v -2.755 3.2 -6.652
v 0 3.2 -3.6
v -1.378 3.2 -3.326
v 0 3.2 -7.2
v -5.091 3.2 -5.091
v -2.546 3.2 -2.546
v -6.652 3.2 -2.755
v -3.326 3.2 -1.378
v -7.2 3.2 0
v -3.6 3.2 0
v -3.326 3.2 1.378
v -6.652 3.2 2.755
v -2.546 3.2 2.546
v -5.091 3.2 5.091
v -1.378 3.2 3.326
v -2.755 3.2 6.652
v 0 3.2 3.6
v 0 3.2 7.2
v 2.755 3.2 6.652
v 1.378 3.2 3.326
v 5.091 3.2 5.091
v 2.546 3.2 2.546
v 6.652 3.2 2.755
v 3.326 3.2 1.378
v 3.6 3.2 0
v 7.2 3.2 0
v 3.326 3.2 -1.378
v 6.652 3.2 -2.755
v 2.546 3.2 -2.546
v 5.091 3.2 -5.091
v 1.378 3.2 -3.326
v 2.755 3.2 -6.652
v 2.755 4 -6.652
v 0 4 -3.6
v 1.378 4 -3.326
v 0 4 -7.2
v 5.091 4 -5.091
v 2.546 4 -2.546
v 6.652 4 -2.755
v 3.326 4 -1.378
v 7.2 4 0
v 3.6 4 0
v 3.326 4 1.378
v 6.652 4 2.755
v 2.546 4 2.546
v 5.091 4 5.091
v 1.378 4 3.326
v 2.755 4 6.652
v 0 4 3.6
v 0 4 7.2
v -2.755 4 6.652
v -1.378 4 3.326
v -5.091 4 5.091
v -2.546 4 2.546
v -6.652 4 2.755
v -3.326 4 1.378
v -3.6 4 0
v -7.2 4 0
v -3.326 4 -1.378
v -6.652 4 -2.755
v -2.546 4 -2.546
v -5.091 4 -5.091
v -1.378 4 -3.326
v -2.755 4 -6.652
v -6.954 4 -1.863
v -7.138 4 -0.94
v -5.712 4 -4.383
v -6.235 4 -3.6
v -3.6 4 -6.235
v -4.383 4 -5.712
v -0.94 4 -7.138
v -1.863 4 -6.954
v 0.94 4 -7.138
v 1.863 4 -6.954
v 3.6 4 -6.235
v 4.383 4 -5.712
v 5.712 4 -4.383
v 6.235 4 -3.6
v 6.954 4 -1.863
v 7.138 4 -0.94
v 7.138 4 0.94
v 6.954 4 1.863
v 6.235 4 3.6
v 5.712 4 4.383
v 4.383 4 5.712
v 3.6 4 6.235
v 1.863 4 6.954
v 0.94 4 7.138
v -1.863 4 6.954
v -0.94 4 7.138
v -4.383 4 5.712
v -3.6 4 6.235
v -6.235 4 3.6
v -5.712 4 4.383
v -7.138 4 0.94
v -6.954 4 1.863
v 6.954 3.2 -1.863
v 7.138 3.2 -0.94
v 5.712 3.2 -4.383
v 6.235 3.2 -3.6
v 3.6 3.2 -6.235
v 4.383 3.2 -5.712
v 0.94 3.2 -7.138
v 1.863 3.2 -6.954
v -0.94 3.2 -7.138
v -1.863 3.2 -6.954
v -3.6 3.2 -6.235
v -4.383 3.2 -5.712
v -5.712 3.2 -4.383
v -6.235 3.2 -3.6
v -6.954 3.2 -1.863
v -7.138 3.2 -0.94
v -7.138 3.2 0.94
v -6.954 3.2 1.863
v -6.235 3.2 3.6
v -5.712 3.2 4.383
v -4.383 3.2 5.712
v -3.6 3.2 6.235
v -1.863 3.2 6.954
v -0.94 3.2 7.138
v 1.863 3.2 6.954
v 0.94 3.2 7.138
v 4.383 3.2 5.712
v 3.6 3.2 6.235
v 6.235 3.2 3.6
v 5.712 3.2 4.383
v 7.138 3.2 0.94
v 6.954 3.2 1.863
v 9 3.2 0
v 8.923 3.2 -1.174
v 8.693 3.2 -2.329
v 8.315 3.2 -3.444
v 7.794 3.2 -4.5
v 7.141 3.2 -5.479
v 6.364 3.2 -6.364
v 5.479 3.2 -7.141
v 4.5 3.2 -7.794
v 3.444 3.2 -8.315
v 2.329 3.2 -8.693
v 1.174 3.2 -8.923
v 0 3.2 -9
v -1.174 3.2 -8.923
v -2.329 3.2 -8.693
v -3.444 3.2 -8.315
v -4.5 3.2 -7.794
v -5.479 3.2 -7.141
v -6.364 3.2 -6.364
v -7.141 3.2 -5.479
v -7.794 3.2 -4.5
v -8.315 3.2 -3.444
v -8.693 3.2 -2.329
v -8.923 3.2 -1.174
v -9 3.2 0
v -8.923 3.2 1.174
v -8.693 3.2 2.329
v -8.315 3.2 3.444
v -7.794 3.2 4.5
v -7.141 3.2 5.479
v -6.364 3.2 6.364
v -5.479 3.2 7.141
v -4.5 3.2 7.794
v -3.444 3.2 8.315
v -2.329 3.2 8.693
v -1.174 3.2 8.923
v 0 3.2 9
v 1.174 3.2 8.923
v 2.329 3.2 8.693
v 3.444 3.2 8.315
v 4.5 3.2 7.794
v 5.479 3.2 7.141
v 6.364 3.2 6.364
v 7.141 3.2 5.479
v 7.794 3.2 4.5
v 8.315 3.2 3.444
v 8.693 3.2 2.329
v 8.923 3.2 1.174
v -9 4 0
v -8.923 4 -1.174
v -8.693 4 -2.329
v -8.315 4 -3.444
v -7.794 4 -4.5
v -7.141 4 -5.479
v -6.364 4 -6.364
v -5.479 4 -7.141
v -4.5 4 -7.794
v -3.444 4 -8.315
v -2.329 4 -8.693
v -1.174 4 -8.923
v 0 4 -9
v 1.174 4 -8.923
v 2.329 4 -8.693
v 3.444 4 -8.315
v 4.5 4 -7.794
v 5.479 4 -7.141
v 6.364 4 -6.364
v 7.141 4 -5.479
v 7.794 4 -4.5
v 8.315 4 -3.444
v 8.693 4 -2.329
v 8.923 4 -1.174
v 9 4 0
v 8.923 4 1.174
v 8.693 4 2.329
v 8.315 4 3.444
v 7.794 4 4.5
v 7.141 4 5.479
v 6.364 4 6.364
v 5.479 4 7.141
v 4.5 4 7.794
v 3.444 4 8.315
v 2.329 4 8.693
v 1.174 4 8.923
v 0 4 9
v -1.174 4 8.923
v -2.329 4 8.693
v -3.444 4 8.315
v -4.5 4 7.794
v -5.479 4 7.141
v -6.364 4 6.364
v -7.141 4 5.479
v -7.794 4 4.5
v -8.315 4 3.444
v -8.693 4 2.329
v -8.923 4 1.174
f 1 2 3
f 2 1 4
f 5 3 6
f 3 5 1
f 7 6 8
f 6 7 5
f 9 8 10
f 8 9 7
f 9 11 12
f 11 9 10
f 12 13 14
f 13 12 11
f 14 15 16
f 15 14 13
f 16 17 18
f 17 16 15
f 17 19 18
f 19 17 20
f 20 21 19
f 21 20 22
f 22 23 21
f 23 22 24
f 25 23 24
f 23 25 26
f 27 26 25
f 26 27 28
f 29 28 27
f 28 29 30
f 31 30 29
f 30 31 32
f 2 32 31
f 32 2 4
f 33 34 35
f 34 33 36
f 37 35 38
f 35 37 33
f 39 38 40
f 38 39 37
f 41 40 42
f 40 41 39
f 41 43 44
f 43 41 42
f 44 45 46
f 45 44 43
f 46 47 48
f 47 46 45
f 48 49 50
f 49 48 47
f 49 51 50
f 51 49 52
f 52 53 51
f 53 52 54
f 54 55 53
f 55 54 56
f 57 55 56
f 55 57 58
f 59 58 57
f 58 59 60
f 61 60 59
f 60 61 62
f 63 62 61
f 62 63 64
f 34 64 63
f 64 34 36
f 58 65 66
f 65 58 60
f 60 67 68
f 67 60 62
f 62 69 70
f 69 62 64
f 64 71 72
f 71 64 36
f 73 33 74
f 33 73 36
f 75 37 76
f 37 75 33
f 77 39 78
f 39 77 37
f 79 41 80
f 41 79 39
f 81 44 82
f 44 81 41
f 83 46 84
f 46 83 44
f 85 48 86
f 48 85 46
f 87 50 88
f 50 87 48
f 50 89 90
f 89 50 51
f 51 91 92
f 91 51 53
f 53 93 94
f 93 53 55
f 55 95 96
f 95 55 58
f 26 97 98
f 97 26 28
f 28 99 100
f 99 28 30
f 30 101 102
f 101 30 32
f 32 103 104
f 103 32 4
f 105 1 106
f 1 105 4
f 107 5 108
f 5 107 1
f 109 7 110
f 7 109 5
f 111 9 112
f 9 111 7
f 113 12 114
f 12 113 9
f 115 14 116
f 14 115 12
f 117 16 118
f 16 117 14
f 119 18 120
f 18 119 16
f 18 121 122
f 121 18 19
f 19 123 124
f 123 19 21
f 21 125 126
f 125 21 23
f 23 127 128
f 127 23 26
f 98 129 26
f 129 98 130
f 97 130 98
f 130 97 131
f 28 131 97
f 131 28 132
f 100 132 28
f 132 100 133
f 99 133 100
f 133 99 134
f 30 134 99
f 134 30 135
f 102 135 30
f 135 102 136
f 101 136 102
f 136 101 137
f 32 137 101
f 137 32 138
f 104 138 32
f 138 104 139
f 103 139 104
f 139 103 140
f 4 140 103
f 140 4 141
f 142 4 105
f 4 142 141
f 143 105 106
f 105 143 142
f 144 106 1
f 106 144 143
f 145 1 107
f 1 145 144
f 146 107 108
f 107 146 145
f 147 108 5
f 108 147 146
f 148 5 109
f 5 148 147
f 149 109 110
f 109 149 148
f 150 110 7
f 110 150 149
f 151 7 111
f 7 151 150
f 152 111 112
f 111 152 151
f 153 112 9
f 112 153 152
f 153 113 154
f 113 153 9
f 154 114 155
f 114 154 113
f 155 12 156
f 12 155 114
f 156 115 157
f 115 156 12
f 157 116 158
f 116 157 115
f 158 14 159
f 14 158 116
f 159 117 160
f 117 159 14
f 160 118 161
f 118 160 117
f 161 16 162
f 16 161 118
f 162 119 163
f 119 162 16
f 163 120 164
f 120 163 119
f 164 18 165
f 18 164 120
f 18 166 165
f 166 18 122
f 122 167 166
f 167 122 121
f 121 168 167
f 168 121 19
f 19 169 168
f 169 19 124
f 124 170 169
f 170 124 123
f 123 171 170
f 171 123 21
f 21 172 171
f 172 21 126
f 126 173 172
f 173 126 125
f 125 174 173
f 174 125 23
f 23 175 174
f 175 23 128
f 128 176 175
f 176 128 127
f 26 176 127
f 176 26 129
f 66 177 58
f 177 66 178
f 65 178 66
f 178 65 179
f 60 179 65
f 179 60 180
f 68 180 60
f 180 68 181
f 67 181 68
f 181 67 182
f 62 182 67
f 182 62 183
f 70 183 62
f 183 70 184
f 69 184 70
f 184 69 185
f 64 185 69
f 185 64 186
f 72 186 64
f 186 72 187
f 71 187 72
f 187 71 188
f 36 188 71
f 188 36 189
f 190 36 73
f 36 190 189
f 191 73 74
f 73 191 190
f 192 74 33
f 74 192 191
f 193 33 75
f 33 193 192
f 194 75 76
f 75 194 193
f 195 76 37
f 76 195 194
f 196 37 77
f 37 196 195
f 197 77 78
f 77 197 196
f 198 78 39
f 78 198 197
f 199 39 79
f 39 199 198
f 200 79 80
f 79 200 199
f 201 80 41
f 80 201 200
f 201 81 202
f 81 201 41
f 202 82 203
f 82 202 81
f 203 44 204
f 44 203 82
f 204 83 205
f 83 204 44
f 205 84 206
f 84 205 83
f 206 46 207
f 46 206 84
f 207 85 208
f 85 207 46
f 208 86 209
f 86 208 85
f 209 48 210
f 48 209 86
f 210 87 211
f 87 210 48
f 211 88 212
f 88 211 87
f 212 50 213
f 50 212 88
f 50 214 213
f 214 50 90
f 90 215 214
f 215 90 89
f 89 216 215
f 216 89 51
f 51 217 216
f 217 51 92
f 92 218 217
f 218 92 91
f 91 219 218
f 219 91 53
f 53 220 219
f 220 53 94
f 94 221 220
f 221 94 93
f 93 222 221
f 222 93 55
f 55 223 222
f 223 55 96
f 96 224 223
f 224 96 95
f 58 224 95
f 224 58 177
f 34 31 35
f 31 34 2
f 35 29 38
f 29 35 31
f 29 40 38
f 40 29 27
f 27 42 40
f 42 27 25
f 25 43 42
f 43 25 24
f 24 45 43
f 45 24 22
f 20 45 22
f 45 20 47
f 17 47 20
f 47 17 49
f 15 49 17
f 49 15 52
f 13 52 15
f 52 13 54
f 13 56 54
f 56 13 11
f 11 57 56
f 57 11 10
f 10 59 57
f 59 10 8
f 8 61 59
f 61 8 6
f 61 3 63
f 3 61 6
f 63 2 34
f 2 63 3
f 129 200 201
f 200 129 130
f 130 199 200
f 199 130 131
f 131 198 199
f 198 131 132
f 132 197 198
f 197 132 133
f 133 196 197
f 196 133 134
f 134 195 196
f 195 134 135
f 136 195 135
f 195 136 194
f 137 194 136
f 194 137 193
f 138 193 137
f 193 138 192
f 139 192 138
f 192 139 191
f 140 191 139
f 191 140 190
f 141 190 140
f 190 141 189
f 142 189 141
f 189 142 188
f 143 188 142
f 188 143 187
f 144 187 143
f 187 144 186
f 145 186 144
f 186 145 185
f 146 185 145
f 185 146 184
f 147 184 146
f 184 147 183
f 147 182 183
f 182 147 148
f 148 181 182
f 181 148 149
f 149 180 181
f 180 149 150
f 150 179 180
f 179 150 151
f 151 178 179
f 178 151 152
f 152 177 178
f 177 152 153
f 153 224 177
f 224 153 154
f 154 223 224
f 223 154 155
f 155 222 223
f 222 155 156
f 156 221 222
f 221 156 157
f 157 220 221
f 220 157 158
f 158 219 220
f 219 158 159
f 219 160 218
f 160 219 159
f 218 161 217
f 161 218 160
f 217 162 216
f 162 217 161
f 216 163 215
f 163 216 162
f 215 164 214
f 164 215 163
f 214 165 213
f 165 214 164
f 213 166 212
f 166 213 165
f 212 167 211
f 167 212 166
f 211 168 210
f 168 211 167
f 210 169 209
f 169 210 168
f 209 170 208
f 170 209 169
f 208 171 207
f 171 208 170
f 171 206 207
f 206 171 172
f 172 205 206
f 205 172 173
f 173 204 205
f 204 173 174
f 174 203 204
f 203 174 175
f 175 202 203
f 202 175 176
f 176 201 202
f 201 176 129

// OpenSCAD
// file: ../p/48/1-4edge.scad
use <../../lib.scad>
function ldraw_lib__48__1_4edge() = [
// 0 Hi-Res Circle 0.25
// 0 Name: 48\1-4edge.dat
// 0 Author: Manfred Moolhuysen
// 0 !LDRAW_ORG 48_Primitive UPDATE 2010-02
// 0 !LICENSE Licensed under CC BY 2.0 and CC BY 4.0 : see CAreadme.txt
// 
// 0 BFC CERTIFY CCW
  [0,"BFC","CERTIFY"],
  [0,"BFC","CCW"],
// 
// 0 !HISTORY 1999-07-05 [PTadmin] Official Update 1999-05
// 0 !HISTORY 2007-06-24 [PTadmin] Header formatted for Contributor Agreement
// 0 !HISTORY 2008-07-01 [PTadmin] Official Update 2008-01
// 0 !HISTORY 2010-03-17 [MagFors] Updated description
// 0 !HISTORY 2010-05-21 [mikeheide] BFC'ed and compacted numbers (saved 10% filesize)
// 0 !HISTORY 2010-07-05 [PTadmin] Official Update 2010-02
// 
// 
// 2 24 1 0 0 0.9914 0 0.1305
  [2,24,1,0,0,0.9914,0,0.1305],
// 2 24 0.9914 0 0.1305 0.9659 0 0.2588
  [2,24,0.9914,0,0.1305,0.9659,0,0.2588],
// 2 24 0.9659 0 0.2588 0.9239 0 0.3827
  [2,24,0.9659,0,0.2588,0.9239,0,0.3827],
// 2 24 0.9239 0 0.3827 0.866 0 0.5
  [2,24,0.9239,0,0.3827,0.866,0,0.5],
// 2 24 0.866 0 0.5 0.7934 0 0.6088
  [2,24,0.866,0,0.5,0.7934,0,0.6088],
// 2 24 0.7934 0 0.6088 0.7071 0 0.7071
  [2,24,0.7934,0,0.6088,0.7071,0,0.7071],
// 2 24 0.7071 0 0.7071 0.6088 0 0.7934
  [2,24,0.7071,0,0.7071,0.6088,0,0.7934],
// 2 24 0.6088 0 0.7934 0.5 0 0.866
  [2,24,0.6088,0,0.7934,0.5,0,0.866],
// 2 24 0.5 0 0.866 0.3827 0 0.9239
  [2,24,0.5,0,0.866,0.3827,0,0.9239],
// 2 24 0.3827 0 0.9239 0.2588 0 0.9659
  [2,24,0.3827,0,0.9239,0.2588,0,0.9659],
// 2 24 0.2588 0 0.9659 0.1305 0 0.9914
  [2,24,0.2588,0,0.9659,0.1305,0,0.9914],
// 2 24 0.1305 0 0.9914 0 0 1
  [2,24,0.1305,0,0.9914,0,0,1],
// 0 //
];
makepoly(ldraw_lib__48__1_4edge(), line=0.2);
// file: ../p/48/1-4cyli.scad
use <../../lib.scad>
function ldraw_lib__48__1_4cyli() = [
// 0 Hi-Res Cylinder 0.25
// 0 Name: 48\1-4cyli.dat
// 0 Author: Manfred Moolhuysen
// 0 !LDRAW_ORG 48_Primitive UPDATE 2009-01
// 0 !LICENSE Licensed under CC BY 2.0 and CC BY 4.0 : see CAreadme.txt
// 
// 0 BFC CERTIFY CCW
  [0,"BFC","CERTIFY"],
  [0,"BFC","CCW"],
// 
// 0 !HISTORY 1999-07-05 [PTadmin] Official Update 1999-05
// 0 !HISTORY 2002-02-28 [hafhead] Added BFC statement
// 0 !HISTORY 2002-04-25 [PTadmin] Official Update 2002-02
// 0 !HISTORY 2007-06-24 [PTadmin] Header formatted for Contributor Agreement
// 0 !HISTORY 2008-07-01 [PTadmin] Official Update 2008-01
// 0 !HISTORY 2008-07-07 [guyvivan] Made BFC'ed CCW (2005-12-06)
// 0 !HISTORY 2009-05-02 [PTadmin] Official Update 2009-01
// 
// 
// 4 16 0.9914 0 0.1305 1 0 0 1 1 0 0.9914 1 0.1305
  [4,16,0.9914,0,0.1305,1,0,0,1,1,0,0.9914,1,0.1305],
// 4 16 0.9659 0 0.2588 0.9914 0 0.1305 0.9914 1 0.1305 0.9659 1 0.2588
  [4,16,0.9659,0,0.2588,0.9914,0,0.1305,0.9914,1,0.1305,0.9659,1,0.2588],
// 4 16 0.9239 0 0.3827 0.9659 0 0.2588 0.9659 1 0.2588 0.9239 1 0.3827
  [4,16,0.9239,0,0.3827,0.9659,0,0.2588,0.9659,1,0.2588,0.9239,1,0.3827],
// 4 16 0.866 0 0.5 0.9239 0 0.3827 0.9239 1 0.3827 0.866 1 0.5
  [4,16,0.866,0,0.5,0.9239,0,0.3827,0.9239,1,0.3827,0.866,1,0.5],
// 4 16 0.7934 0 0.6088 0.866 0 0.5 0.866 1 0.5 0.7934 1 0.6088
  [4,16,0.7934,0,0.6088,0.866,0,0.5,0.866,1,0.5,0.7934,1,0.6088],
// 4 16 0.7071 0 0.7071 0.7934 0 0.6088 0.7934 1 0.6088 0.7071 1 0.7071
  [4,16,0.7071,0,0.7071,0.7934,0,0.6088,0.7934,1,0.6088,0.7071,1,0.7071],
// 4 16 0.6088 0 0.7934 0.7071 0 0.7071 0.7071 1 0.7071 0.6088 1 0.7934
  [4,16,0.6088,0,0.7934,0.7071,0,0.7071,0.7071,1,0.7071,0.6088,1,0.7934],
// 4 16 0.5 0 0.866 0.6088 0 0.7934 0.6088 1 0.7934 0.5 1 0.866
  [4,16,0.5,0,0.866,0.6088,0,0.7934,0.6088,1,0.7934,0.5,1,0.866],
// 4 16 0.3827 0 0.9239 0.5 0 0.866 0.5 1 0.866 0.3827 1 0.9239
  [4,16,0.3827,0,0.9239,0.5,0,0.866,0.5,1,0.866,0.3827,1,0.9239],
// 4 16 0.2588 0 0.9659 0.3827 0 0.9239 0.3827 1 0.9239 0.2588 1 0.9659
  [4,16,0.2588,0,0.9659,0.3827,0,0.9239,0.3827,1,0.9239,0.2588,1,0.9659],
// 4 16 0.1305 0 0.9914 0.2588 0 0.9659 0.2588 1 0.9659 0.1305 1 0.9914
  [4,16,0.1305,0,0.9914,0.2588,0,0.9659,0.2588,1,0.9659,0.1305,1,0.9914],
// 4 16 0 0 1 0.1305 0 0.9914 0.1305 1 0.9914 0 1 1
  [4,16,0,0,1,0.1305,0,0.9914,0.1305,1,0.9914,0,1,1],
// 
// 0 conditional lines
// 5 24 1 1 0 1 0 0 1 1 -1 0.9914 1 0.1305
  [5,24,1,1,0,1,0,0,1,1,-1,0.9914,1,0.1305],
// 5 24 0.9914 1 0.1305 0.9914 0 0.1305 1 1 0 0.9659 1 0.2588
  [5,24,0.9914,1,0.1305,0.9914,0,0.1305,1,1,0,0.9659,1,0.2588],
// 5 24 0.9659 1 0.2588 0.9659 0 0.2588 0.9914 1 0.1305 0.9239 1 0.3827
  [5,24,0.9659,1,0.2588,0.9659,0,0.2588,0.9914,1,0.1305,0.9239,1,0.3827],
// 5 24 0.9239 1 0.3827 0.9239 0 0.3827 0.9659 1 0.2588 0.866 1 0.5
  [5,24,0.9239,1,0.3827,0.9239,0,0.3827,0.9659,1,0.2588,0.866,1,0.5],
// 5 24 0.866 1 0.5 0.866 0 0.5 0.9239 1 0.3827 0.7934 1 0.6088
  [5,24,0.866,1,0.5,0.866,0,0.5,0.9239,1,0.3827,0.7934,1,0.6088],
// 5 24 0.7934 1 0.6088 0.7934 0 0.6088 0.866 1 0.5 0.7071 1 0.7071
  [5,24,0.7934,1,0.6088,0.7934,0,0.6088,0.866,1,0.5,0.7071,1,0.7071],
// 5 24 0.7071 1 0.7071 0.7071 0 0.7071 0.7934 1 0.6088 0.6088 1 0.7934
  [5,24,0.7071,1,0.7071,0.7071,0,0.7071,0.7934,1,0.6088,0.6088,1,0.7934],
// 5 24 0.6088 1 0.7934 0.6088 0 0.7934 0.7071 1 0.7071 0.5 1 0.866
  [5,24,0.6088,1,0.7934,0.6088,0,0.7934,0.7071,1,0.7071,0.5,1,0.866],
// 5 24 0.5 1 0.866 0.5 0 0.866 0.6088 1 0.7934 0.3827 1 0.9239
  [5,24,0.5,1,0.866,0.5,0,0.866,0.6088,1,0.7934,0.3827,1,0.9239],
// 5 24 0.3827 1 0.9239 0.3827 0 0.9239 0.5 1 0.866 0.2588 1 0.9659
  [5,24,0.3827,1,0.9239,0.3827,0,0.9239,0.5,1,0.866,0.2588,1,0.9659],
// 5 24 0.2588 1 0.9659 0.2588 0 0.9659 0.3827 1 0.9239 0.1305 1 0.9914
  [5,24,0.2588,1,0.9659,0.2588,0,0.9659,0.3827,1,0.9239,0.1305,1,0.9914],
// 5 24 0.1305 1 0.9914 0.1305 0 0.9914 0.2588 1 0.9659 0 1 1
  [5,24,0.1305,1,0.9914,0.1305,0,0.9914,0.2588,1,0.9659,0,1,1],
// 5 24 0 1 1 0 0 1 0.1305 1 0.9914 -1 1 1
  [5,24,0,1,1,0,0,1,0.1305,1,0.9914,-1,1,1],
// 
// 0 end of file
];
makepoly(ldraw_lib__48__1_4cyli(), line=0.2);
// file: ../p/48/4-4ring4.scad
use <../../lib.scad>
function ldraw_lib__48__4_4ring4() = [
// 0 Hi-Res Ring  4 x 1.0
// 0 Name: 48\4-4ring4.dat
// 0 Author: Mark Kennedy [mkennedy]
// 0 !LDRAW_ORG 48_Primitive UPDATE 2012-02
// 0 !LICENSE Licensed under CC BY 2.0 and CC BY 4.0 : see CAreadme.txt
// 
// 0 BFC CERTIFY CCW
  [0,"BFC","CERTIFY"],
  [0,"BFC","CCW"],
// 
// 0 !HISTORY 2004-04-22 [PTadmin] Official Update 2004-02
// 0 !HISTORY 2007-06-24 [PTadmin] Header formatted for Contributor Agreement
// 0 !HISTORY 2008-07-01 [PTadmin] Official Update 2008-01
// 0 !HISTORY 2012-02-27 [Philo] Changed to CCW
// 0 !HISTORY 2012-08-09 [PTadmin] Official Update 2012-02
// 
// 
// 4 16 5 0 0 4.957 0 0.6525 3.9656 0 0.522 4 0 0
  [4,16,5,0,0,4.957,0,0.6525,3.9656,0,0.522,4,0,0],
// 4 16 4.957 0 0.6525 4.8295 0 1.294 3.8636 0 1.0352 3.9656 0 0.522
  [4,16,4.957,0,0.6525,4.8295,0,1.294,3.8636,0,1.0352,3.9656,0,0.522],
// 4 16 4.8295 0 1.294 4.6195 0 1.9135 3.6956 0 1.5308 3.8636 0 1.0352
  [4,16,4.8295,0,1.294,4.6195,0,1.9135,3.6956,0,1.5308,3.8636,0,1.0352],
// 4 16 4.6195 0 1.9135 4.33 0 2.5 3.464 0 2 3.6956 0 1.5308
  [4,16,4.6195,0,1.9135,4.33,0,2.5,3.464,0,2,3.6956,0,1.5308],
// 4 16 4.33 0 2.5 3.967 0 3.044 3.1736 0 2.4352 3.464 0 2
  [4,16,4.33,0,2.5,3.967,0,3.044,3.1736,0,2.4352,3.464,0,2],
// 4 16 3.967 0 3.044 3.5355 0 3.5355 2.8284 0 2.8284 3.1736 0 2.4352
  [4,16,3.967,0,3.044,3.5355,0,3.5355,2.8284,0,2.8284,3.1736,0,2.4352],
// 4 16 3.5355 0 3.5355 3.044 0 3.967 2.4352 0 3.1736 2.8284 0 2.8284
  [4,16,3.5355,0,3.5355,3.044,0,3.967,2.4352,0,3.1736,2.8284,0,2.8284],
// 4 16 3.044 0 3.967 2.5 0 4.33 2 0 3.464 2.4352 0 3.1736
  [4,16,3.044,0,3.967,2.5,0,4.33,2,0,3.464,2.4352,0,3.1736],
// 4 16 2.5 0 4.33 1.9135 0 4.6195 1.5308 0 3.6956 2 0 3.464
  [4,16,2.5,0,4.33,1.9135,0,4.6195,1.5308,0,3.6956,2,0,3.464],
// 4 16 1.9135 0 4.6195 1.294 0 4.8295 1.0352 0 3.8636 1.5308 0 3.6956
  [4,16,1.9135,0,4.6195,1.294,0,4.8295,1.0352,0,3.8636,1.5308,0,3.6956],
// 4 16 1.294 0 4.8295 0.6525 0 4.957 0.522 0 3.9656 1.0352 0 3.8636
  [4,16,1.294,0,4.8295,0.6525,0,4.957,0.522,0,3.9656,1.0352,0,3.8636],
// 4 16 0.6525 0 4.957 0 0 5 0 0 4 0.522 0 3.9656
  [4,16,0.6525,0,4.957,0,0,5,0,0,4,0.522,0,3.9656],
// 4 16 0 0 5 -0.6525 0 4.957 -0.522 0 3.9656 0 0 4
  [4,16,0,0,5,-0.6525,0,4.957,-0.522,0,3.9656,0,0,4],
// 4 16 -0.6525 0 4.957 -1.294 0 4.8295 -1.0352 0 3.8636 -0.522 0 3.9656
  [4,16,-0.6525,0,4.957,-1.294,0,4.8295,-1.0352,0,3.8636,-0.522,0,3.9656],
// 4 16 -1.294 0 4.8295 -1.9135 0 4.6195 -1.5308 0 3.6956 -1.0352 0 3.8636
  [4,16,-1.294,0,4.8295,-1.9135,0,4.6195,-1.5308,0,3.6956,-1.0352,0,3.8636],
// 4 16 -1.9135 0 4.6195 -2.5 0 4.33 -2 0 3.464 -1.5308 0 3.6956
  [4,16,-1.9135,0,4.6195,-2.5,0,4.33,-2,0,3.464,-1.5308,0,3.6956],
// 4 16 -2.5 0 4.33 -3.044 0 3.967 -2.4352 0 3.1736 -2 0 3.464
  [4,16,-2.5,0,4.33,-3.044,0,3.967,-2.4352,0,3.1736,-2,0,3.464],
// 4 16 -3.044 0 3.967 -3.5355 0 3.5355 -2.8284 0 2.8284 -2.4352 0 3.1736
  [4,16,-3.044,0,3.967,-3.5355,0,3.5355,-2.8284,0,2.8284,-2.4352,0,3.1736],
// 4 16 -3.5355 0 3.5355 -3.967 0 3.044 -3.1736 0 2.4352 -2.8284 0 2.8284
  [4,16,-3.5355,0,3.5355,-3.967,0,3.044,-3.1736,0,2.4352,-2.8284,0,2.8284],
// 4 16 -3.967 0 3.044 -4.33 0 2.5 -3.464 0 2 -3.1736 0 2.4352
  [4,16,-3.967,0,3.044,-4.33,0,2.5,-3.464,0,2,-3.1736,0,2.4352],
// 4 16 -4.33 0 2.5 -4.6195 0 1.9135 -3.6956 0 1.5308 -3.464 0 2
  [4,16,-4.33,0,2.5,-4.6195,0,1.9135,-3.6956,0,1.5308,-3.464,0,2],
// 4 16 -4.6195 0 1.9135 -4.8295 0 1.294 -3.8636 0 1.0352 -3.6956 0 1.5308
  [4,16,-4.6195,0,1.9135,-4.8295,0,1.294,-3.8636,0,1.0352,-3.6956,0,1.5308],
// 4 16 -4.8295 0 1.294 -4.957 0 0.6525 -3.9656 0 0.522 -3.8636 0 1.0352
  [4,16,-4.8295,0,1.294,-4.957,0,0.6525,-3.9656,0,0.522,-3.8636,0,1.0352],
// 4 16 -4.957 0 0.6525 -5 0 0 -4 0 0 -3.9656 0 0.522
  [4,16,-4.957,0,0.6525,-5,0,0,-4,0,0,-3.9656,0,0.522],
// 4 16 -5 0 0 -4.957 0 -0.6525 -3.9656 0 -0.522 -4 0 0
  [4,16,-5,0,0,-4.957,0,-0.6525,-3.9656,0,-0.522,-4,0,0],
// 4 16 -4.957 0 -0.6525 -4.8295 0 -1.294 -3.8636 0 -1.0352 -3.9656 0 -0.522
  [4,16,-4.957,0,-0.6525,-4.8295,0,-1.294,-3.8636,0,-1.0352,-3.9656,0,-0.522],
// 4 16 -4.8295 0 -1.294 -4.6195 0 -1.9135 -3.6956 0 -1.5308 -3.8636 0 -1.0352
  [4,16,-4.8295,0,-1.294,-4.6195,0,-1.9135,-3.6956,0,-1.5308,-3.8636,0,-1.0352],
// 4 16 -4.6195 0 -1.9135 -4.33 0 -2.5 -3.464 0 -2 -3.6956 0 -1.5308
  [4,16,-4.6195,0,-1.9135,-4.33,0,-2.5,-3.464,0,-2,-3.6956,0,-1.5308],
// 4 16 -4.33 0 -2.5 -3.967 0 -3.044 -3.1736 0 -2.4352 -3.464 0 -2
  [4,16,-4.33,0,-2.5,-3.967,0,-3.044,-3.1736,0,-2.4352,-3.464,0,-2],
// 4 16 -3.967 0 -3.044 -3.5355 0 -3.5355 -2.8284 0 -2.8284 -3.1736 0 -2.4352
  [4,16,-3.967,0,-3.044,-3.5355,0,-3.5355,-2.8284,0,-2.8284,-3.1736,0,-2.4352],
// 4 16 -3.5355 0 -3.5355 -3.044 0 -3.967 -2.4352 0 -3.1736 -2.8284 0 -2.8284
  [4,16,-3.5355,0,-3.5355,-3.044,0,-3.967,-2.4352,0,-3.1736,-2.8284,0,-2.8284],
// 4 16 -3.044 0 -3.967 -2.5 0 -4.33 -2 0 -3.464 -2.4352 0 -3.1736
  [4,16,-3.044,0,-3.967,-2.5,0,-4.33,-2,0,-3.464,-2.4352,0,-3.1736],
// 4 16 -2.5 0 -4.33 -1.9135 0 -4.6195 -1.5308 0 -3.6956 -2 0 -3.464
  [4,16,-2.5,0,-4.33,-1.9135,0,-4.6195,-1.5308,0,-3.6956,-2,0,-3.464],
// 4 16 -1.9135 0 -4.6195 -1.294 0 -4.8295 -1.0352 0 -3.8636 -1.5308 0 -3.6956
  [4,16,-1.9135,0,-4.6195,-1.294,0,-4.8295,-1.0352,0,-3.8636,-1.5308,0,-3.6956],
// 4 16 -1.294 0 -4.8295 -0.6525 0 -4.957 -0.522 0 -3.9656 -1.0352 0 -3.8636
  [4,16,-1.294,0,-4.8295,-0.6525,0,-4.957,-0.522,0,-3.9656,-1.0352,0,-3.8636],
// 4 16 -0.6525 0 -4.957 0 0 -5 0 0 -4 -0.522 0 -3.9656
  [4,16,-0.6525,0,-4.957,0,0,-5,0,0,-4,-0.522,0,-3.9656],
// 4 16 0 0 -5 0.6525 0 -4.957 0.522 0 -3.9656 0 0 -4
  [4,16,0,0,-5,0.6525,0,-4.957,0.522,0,-3.9656,0,0,-4],
// 4 16 0.6525 0 -4.957 1.294 0 -4.8295 1.0352 0 -3.8636 0.522 0 -3.9656
  [4,16,0.6525,0,-4.957,1.294,0,-4.8295,1.0352,0,-3.8636,0.522,0,-3.9656],
// 4 16 1.294 0 -4.8295 1.9135 0 -4.6195 1.5308 0 -3.6956 1.0352 0 -3.8636
  [4,16,1.294,0,-4.8295,1.9135,0,-4.6195,1.5308,0,-3.6956,1.0352,0,-3.8636],
// 4 16 1.9135 0 -4.6195 2.5 0 -4.33 2 0 -3.464 1.5308 0 -3.6956
  [4,16,1.9135,0,-4.6195,2.5,0,-4.33,2,0,-3.464,1.5308,0,-3.6956],
// 4 16 2.5 0 -4.33 3.044 0 -3.967 2.4352 0 -3.1736 2 0 -3.464
  [4,16,2.5,0,-4.33,3.044,0,-3.967,2.4352,0,-3.1736,2,0,-3.464],
// 4 16 3.044 0 -3.967 3.5355 0 -3.5355 2.8284 0 -2.8284 2.4352 0 -3.1736
  [4,16,3.044,0,-3.967,3.5355,0,-3.5355,2.8284,0,-2.8284,2.4352,0,-3.1736],
// 4 16 3.5355 0 -3.5355 3.967 0 -3.044 3.1736 0 -2.4352 2.8284 0 -2.8284
  [4,16,3.5355,0,-3.5355,3.967,0,-3.044,3.1736,0,-2.4352,2.8284,0,-2.8284],
// 4 16 3.967 0 -3.044 4.33 0 -2.5 3.464 0 -2 3.1736 0 -2.4352
  [4,16,3.967,0,-3.044,4.33,0,-2.5,3.464,0,-2,3.1736,0,-2.4352],
// 4 16 4.33 0 -2.5 4.6195 0 -1.9135 3.6956 0 -1.5308 3.464 0 -2
  [4,16,4.33,0,-2.5,4.6195,0,-1.9135,3.6956,0,-1.5308,3.464,0,-2],
// 4 16 4.6195 0 -1.9135 4.8295 0 -1.294 3.8636 0 -1.0352 3.6956 0 -1.5308
  [4,16,4.6195,0,-1.9135,4.8295,0,-1.294,3.8636,0,-1.0352,3.6956,0,-1.5308],
// 4 16 4.8295 0 -1.294 4.957 0 -0.6525 3.9656 0 -0.522 3.8636 0 -1.0352
  [4,16,4.8295,0,-1.294,4.957,0,-0.6525,3.9656,0,-0.522,3.8636,0,-1.0352],
// 4 16 4.957 0 -0.6525 5 0 0 4 0 0 3.9656 0 -0.522
  [4,16,4.957,0,-0.6525,5,0,0,4,0,0,3.9656,0,-0.522],
];
makepoly(ldraw_lib__48__4_4ring4(), line=0.2);
// file: ../p/48/4-4edge.scad
use <../../lib.scad>
use <1-4edge.scad>
function ldraw_lib__48__4_4edge() = [
// 0 Hi-Res Circle 1.0
// 0 Name: 48\4-4edge.dat
// 0 Author: Paul Easter [pneaster]
// 0 !LDRAW_ORG 48_Primitive UPDATE 2012-01
// 0 !LICENSE Licensed under CC BY 2.0 and CC BY 4.0 : see CAreadme.txt
// 
// 0 BFC CERTIFY CCW
  [0,"BFC","CERTIFY"],
  [0,"BFC","CCW"],
// 
// 0 !HISTORY 2002-08-18 [PTadmin] Official Update 2002-04
// 0 !HISTORY 2007-06-24 [PTadmin] Header formatted for Contributor Agreement
// 0 !HISTORY 2008-07-01 [PTadmin] Official Update 2008-01
// 0 !HISTORY 2012-01-15 [MagFors] BFC'ed, title changed from Edge to Circle
// 0 !HISTORY 2012-03-30 [PTadmin] Official Update 2012-01
// 
// 
// 1 16 0 0 0 1 0 0 0 1 0 0 0 1 48\1-4edge.dat
  [1,16,0,0,0,1,0,0,0,1,0,0,0,1, ldraw_lib__48__1_4edge()],
// 1 16 0 0 0 0 0 -1 0 1 0 1 0 0 48\1-4edge.dat
  [1,16,0,0,0,0,0,-1,0,1,0,1,0,0, ldraw_lib__48__1_4edge()],
// 1 16 0 0 0 -1 0 0 0 1 0 0 0 -1 48\1-4edge.dat
  [1,16,0,0,0,-1,0,0,0,1,0,0,0,-1, ldraw_lib__48__1_4edge()],
// 1 16 0 0 0 0 0 1 0 1 0 -1 0 0 48\1-4edge.dat
  [1,16,0,0,0,0,0,1,0,1,0,-1,0,0, ldraw_lib__48__1_4edge()],
// 
];
makepoly(ldraw_lib__48__4_4edge(), line=0.2);
// file: ../p/48/4-4cyli.scad
use <../../lib.scad>
use <1-4cyli.scad>
function ldraw_lib__48__4_4cyli() = [
// 0 Hi-Res Cylinder 1.0
// 0 Name: 48\4-4cyli.dat
// 0 Author: Paul Easter [pneaster]
// 0 !LDRAW_ORG 48_Primitive UPDATE 2012-02
// 0 !LICENSE Licensed under CC BY 2.0 and CC BY 4.0 : see CAreadme.txt
// 
// 0 BFC CERTIFY CCW
  [0,"BFC","CERTIFY"],
  [0,"BFC","CCW"],
// 
// 0 !HISTORY 2002-08-18 [PTadmin] Official Update 2002-04
// 0 !HISTORY 2007-06-24 [PTadmin] Header formatted for Contributor Agreement
// 0 !HISTORY 2008-07-01 [PTadmin] Official Update 2008-01
// 0 !HISTORY 2012-02-27 [Philo] Changed to CCW
// 0 !HISTORY 2012-08-09 [PTadmin] Official Update 2012-02
// 
// 
// 1 16 0 0 0 1 0 0 0 1 0 0 0 1 48\1-4cyli.dat
  [1,16,0,0,0,1,0,0,0,1,0,0,0,1, ldraw_lib__48__1_4cyli()],
// 1 16 0 0 0 0 0 -1 0 1 0 1 0 0 48\1-4cyli.dat
  [1,16,0,0,0,0,0,-1,0,1,0,1,0,0, ldraw_lib__48__1_4cyli()],
// 1 16 0 0 0 -1 0 0 0 1 0 0 0 -1 48\1-4cyli.dat
  [1,16,0,0,0,-1,0,0,0,1,0,0,0,-1, ldraw_lib__48__1_4cyli()],
// 1 16 0 0 0 0 0 1 0 1 0 -1 0 0 48\1-4cyli.dat
  [1,16,0,0,0,0,0,1,0,1,0,-1,0,0, ldraw_lib__48__1_4cyli()],
];
makepoly(ldraw_lib__48__4_4cyli(), line=0.2);
// file: ../p/48/4-4aring.scad
use <../../lib.scad>
function ldraw_lib__48__4_4aring() = [
// 0 Adapter Ring Hi-Res to Normal 1.0
// 0 Name: 48\4-4aring.dat
// 0 Author: Philippe Hurbain [Philo]
// 0 !LDRAW_ORG 48_Primitive UPDATE 2010-02
// 0 !LICENSE Licensed under CC BY 2.0 and CC BY 4.0 : see CAreadme.txt
// 
// 0 BFC CERTIFY CCW
  [0,"BFC","CERTIFY"],
  [0,"BFC","CCW"],
// 
// 0 !HISTORY 2010-07-05 [PTadmin] Official Update 2010-02
// 
// 
// 4 16 0.9239 0 0.3827 1 0 0 0.9914 0 0.1305 0.9659 0 0.2588
  [4,16,0.9239,0,0.3827,1,0,0,0.9914,0,0.1305,0.9659,0,0.2588],
// 4 16 0.7071 0 0.7071 0.9239 0 0.3827 0.866 0 0.5 0.7934 0 0.6088
  [4,16,0.7071,0,0.7071,0.9239,0,0.3827,0.866,0,0.5,0.7934,0,0.6088],
// 4 16 0.3827 0 0.9239 0.7071 0 0.7071 0.6088 0 0.7934 0.5 0 0.866
  [4,16,0.3827,0,0.9239,0.7071,0,0.7071,0.6088,0,0.7934,0.5,0,0.866],
// 4 16 0 0 1 0.3827 0 0.9239 0.2588 0 0.9659 0.1305 0 0.9914
  [4,16,0,0,1,0.3827,0,0.9239,0.2588,0,0.9659,0.1305,0,0.9914],
// 4 16 -0.3827 0 0.9239 0 0 1 -0.1305 0 0.9914 -0.2588 0 0.9659
  [4,16,-0.3827,0,0.9239,0,0,1,-0.1305,0,0.9914,-0.2588,0,0.9659],
// 4 16 -0.7071 0 0.7071 -0.3827 0 0.9239 -0.5 0 0.866 -0.6088 0 0.7934
  [4,16,-0.7071,0,0.7071,-0.3827,0,0.9239,-0.5,0,0.866,-0.6088,0,0.7934],
// 4 16 -0.9239 0 0.3827 -0.7071 0 0.7071 -0.7934 0 0.6088 -0.866 0 0.5
  [4,16,-0.9239,0,0.3827,-0.7071,0,0.7071,-0.7934,0,0.6088,-0.866,0,0.5],
// 4 16 -1 0 0 -0.9239 0 0.3827 -0.9659 0 0.2588 -0.9914 0 0.1305
  [4,16,-1,0,0,-0.9239,0,0.3827,-0.9659,0,0.2588,-0.9914,0,0.1305],
// 4 16 -0.9239 0 -0.3827 -1 0 0 -0.9914 0 -0.1305 -0.9659 0 -0.2588
  [4,16,-0.9239,0,-0.3827,-1,0,0,-0.9914,0,-0.1305,-0.9659,0,-0.2588],
// 4 16 -0.7071 0 -0.7071 -0.9239 0 -0.3827 -0.866 0 -0.5 -0.7934 0 -0.6088
  [4,16,-0.7071,0,-0.7071,-0.9239,0,-0.3827,-0.866,0,-0.5,-0.7934,0,-0.6088],
// 4 16 -0.3827 0 -0.9239 -0.7071 0 -0.7071 -0.6088 0 -0.7934 -0.5 0 -0.866
  [4,16,-0.3827,0,-0.9239,-0.7071,0,-0.7071,-0.6088,0,-0.7934,-0.5,0,-0.866],
// 4 16 0 0 -1 -0.3827 0 -0.9239 -0.2588 0 -0.9659 -0.1305 0 -0.9914
  [4,16,0,0,-1,-0.3827,0,-0.9239,-0.2588,0,-0.9659,-0.1305,0,-0.9914],
// 4 16 0.3827 0 -0.9239 0 0 -1 0.1305 0 -0.9914 0.2588 0 -0.9659
  [4,16,0.3827,0,-0.9239,0,0,-1,0.1305,0,-0.9914,0.2588,0,-0.9659],
// 4 16 0.7071 0 -0.7071 0.3827 0 -0.9239 0.5 0 -0.866 0.6088 0 -0.7934
  [4,16,0.7071,0,-0.7071,0.3827,0,-0.9239,0.5,0,-0.866,0.6088,0,-0.7934],
// 4 16 0.9239 0 -0.3827 0.7071 0 -0.7071 0.7934 0 -0.6088 0.866 0 -0.5
  [4,16,0.9239,0,-0.3827,0.7071,0,-0.7071,0.7934,0,-0.6088,0.866,0,-0.5],
// 4 16 1 0 0 0.9239 0 -0.3827 0.9659 0 -0.2588 0.9914 0 -0.1305
  [4,16,1,0,0,0.9239,0,-0.3827,0.9659,0,-0.2588,0.9914,0,-0.1305],
// 0 //
];
makepoly(ldraw_lib__48__4_4aring(), line=0.2);
// file: ../p/4-4ring1.scad
use <../lib.scad>
function ldraw_lib__4_4ring1() = [
// 0 Ring  1 x 1.0
// 0 Name: 4-4ring1.dat
// 0 Author: James Jessiman
// 0 !LDRAW_ORG Primitive UPDATE 2009-01
// 0 !LICENSE Licensed under CC BY 2.0 and CC BY 4.0 : see CAreadme.txt
// 
// 0 BFC CERTIFY CCW
  [0,"BFC","CERTIFY"],
  [0,"BFC","CCW"],
// 
// 0 !HISTORY 1998-12-15 [PTadmin] Official Update 1998-10
// 0 !HISTORY 2002-04-08 [BrickCaster] Modified for BFC compliance
// 0 !HISTORY 2002-04-25 [PTadmin] Official Update 2002-02
// 0 !HISTORY 2007-06-24 [PTadmin] Header formatted for Contributor Agreement
// 0 !HISTORY 2008-07-01 [PTadmin] Official Update 2008-01
// 0 !HISTORY 2008-08-26 [cwdee] Switch polygon winding and rename
// 0 !HISTORY 2009-05-02 [PTadmin] Official Update 2009-01
// 
// 
// 4 16 -0.7654 0 1.8478 -0.3827 0 0.9239 0 0 1 0 0 2
  [4,16,-0.7654,0,1.8478,-0.3827,0,0.9239,0,0,1,0,0,2],
// 4 16 -1.4142 0 1.4142 -0.7071 0 0.7071 -0.3827 0 0.9239 -0.7654 0 1.8478
  [4,16,-1.4142,0,1.4142,-0.7071,0,0.7071,-0.3827,0,0.9239,-0.7654,0,1.8478],
// 4 16 -1.8478 0 0.7654 -0.9239 0 0.3827 -0.7071 0 0.7071 -1.4142 0 1.41420
  [4,16,-1.8478,0,0.7654,-0.9239,0,0.3827,-0.7071,0,0.7071,-1.4142,0,1.41420],
// 4 16 -2 0 0 -1 0 0 -0.9239 0 0.3827 -1.8478 0 0.7654
  [4,16,-2,0,0,-1,0,0,-0.9239,0,0.3827,-1.8478,0,0.7654],
// 4 16 -1.8478 0 -0.7654 -0.9239 0 -0.3827 -1 0 0 -2 0 0
  [4,16,-1.8478,0,-0.7654,-0.9239,0,-0.3827,-1,0,0,-2,0,0],
// 4 16 -1.4142 0 -1.4142 -0.7071 0 -0.7071 -0.9239 0 -0.3827 -1.8478 0 -0.7654
  [4,16,-1.4142,0,-1.4142,-0.7071,0,-0.7071,-0.9239,0,-0.3827,-1.8478,0,-0.7654],
// 4 16 -0.7654 0 -1.8478 -0.3827 0 -0.9239 -0.7071 0 -0.7071 -1.4142 0 -1.4142
  [4,16,-0.7654,0,-1.8478,-0.3827,0,-0.9239,-0.7071,0,-0.7071,-1.4142,0,-1.4142],
// 4 16 0 0 -2 0 0 -1 -0.3827 0 -0.9239 -0.7654 0 -1.8478
  [4,16,0,0,-2,0,0,-1,-0.3827,0,-0.9239,-0.7654,0,-1.8478],
// 4 16 0.7654 0 -1.8478 0.3827 0 -0.9239 0 0 -1 0 0 -2
  [4,16,0.7654,0,-1.8478,0.3827,0,-0.9239,0,0,-1,0,0,-2],
// 4 16 1.4142 0 -1.4142 0.7071 0 -0.7071 0.3827 0 -0.9239 0.7654 0 -1.8478
  [4,16,1.4142,0,-1.4142,0.7071,0,-0.7071,0.3827,0,-0.9239,0.7654,0,-1.8478],
// 4 16 1.8478 0 -0.7654 0.9239 0 -0.3827 0.7071 0 -0.7071 1.4142 0 -1.4142
  [4,16,1.8478,0,-0.7654,0.9239,0,-0.3827,0.7071,0,-0.7071,1.4142,0,-1.4142],
// 4 16 2 0 0 1 0 0 0.9239 0 -0.3827 1.8478 0 -0.7654
  [4,16,2,0,0,1,0,0,0.9239,0,-0.3827,1.8478,0,-0.7654],
// 4 16 1.8478 0 0.7654 0.9239 0 0.3827 1 0 0 2 0 0
  [4,16,1.8478,0,0.7654,0.9239,0,0.3827,1,0,0,2,0,0],
// 4 16 1.4142 0 1.4142 0.7071 0 0.7071 0.9239 0 0.3827 1.8478 0 0.7654
  [4,16,1.4142,0,1.4142,0.7071,0,0.7071,0.9239,0,0.3827,1.8478,0,0.7654],
// 4 16 0.7654 0 1.8478 0.3827 0 0.9239 0.7071 0 0.7071 1.4142 0 1.4142
  [4,16,0.7654,0,1.8478,0.3827,0,0.9239,0.7071,0,0.7071,1.4142,0,1.4142],
// 4 16 0 0 2 0 0 1 0.3827 0 0.9239 0.7654 0 1.8478
  [4,16,0,0,2,0,0,1,0.3827,0,0.9239,0.7654,0,1.8478],
// 0
];
makepoly(ldraw_lib__4_4ring1(), line=0.2);
// file: ../p/4-4edge.scad
use <../lib.scad>
function ldraw_lib__4_4edge() = [
// 0 Circle 1.0
// 0 Name: 4-4edge.dat
// 0 Author: James Jessiman
// 0 !LDRAW_ORG Primitive UPDATE 2017-01
// 0 !LICENSE Licensed under CC BY 2.0 and CC BY 4.0 : see CAreadme.txt
// 
// 0 BFC CERTIFY CCW
  [0,"BFC","CERTIFY"],
  [0,"BFC","CCW"],
// 
// 0 !HISTORY 1998-12-15 [PTadmin] Official Update 1998-10
// 0 !HISTORY 2005-12-28 [PTadmin] Official Update 2005-01
// 0 !HISTORY 2007-06-24 [PTadmin] Header formatted for Contributor Agreement
// 0 !HISTORY 2008-07-01 [PTadmin] Official Update 2008-01
// 0 !HISTORY 2017-01-15 [Steffen] BFCed
// 0 !HISTORY 2017-12-30 [PTadmin] Official Update 2017-01
// 
// 
// 2 24 1 0 0 0.9239 0 0.3827
  [2,24,1,0,0,0.9239,0,0.3827],
// 2 24 0.9239 0 0.3827 0.7071 0 0.7071
  [2,24,0.9239,0,0.3827,0.7071,0,0.7071],
// 2 24 0.7071 0 0.7071 0.3827 0 0.9239
  [2,24,0.7071,0,0.7071,0.3827,0,0.9239],
// 2 24 0.3827 0 0.9239 0 0 1
  [2,24,0.3827,0,0.9239,0,0,1],
// 2 24 0 0 1 -0.3827 0 0.9239
  [2,24,0,0,1,-0.3827,0,0.9239],
// 2 24 -0.3827 0 0.9239 -0.7071 0 0.7071
  [2,24,-0.3827,0,0.9239,-0.7071,0,0.7071],
// 2 24 -0.7071 0 0.7071 -0.9239 0 0.3827
  [2,24,-0.7071,0,0.7071,-0.9239,0,0.3827],
// 2 24 -0.9239 0 0.3827 -1 0 -0
  [2,24,-0.9239,0,0.3827,-1,0,-0],
// 2 24 -1 0 -0 -0.9239 0 -0.3827
  [2,24,-1,0,-0,-0.9239,0,-0.3827],
// 2 24 -0.9239 0 -0.3827 -0.7071 0 -0.7071
  [2,24,-0.9239,0,-0.3827,-0.7071,0,-0.7071],
// 2 24 -0.7071 0 -0.7071 -0.3827 0 -0.9239
  [2,24,-0.7071,0,-0.7071,-0.3827,0,-0.9239],
// 2 24 -0.3827 0 -0.9239 0 0 -1
  [2,24,-0.3827,0,-0.9239,0,0,-1],
// 2 24 0 0 -1 0.3827 0 -0.9239
  [2,24,0,0,-1,0.3827,0,-0.9239],
// 2 24 0.3827 0 -0.9239 0.7071 0 -0.7071
  [2,24,0.3827,0,-0.9239,0.7071,0,-0.7071],
// 2 24 0.7071 0 -0.7071 0.9239 0 -0.3827
  [2,24,0.7071,0,-0.7071,0.9239,0,-0.3827],
// 2 24 0.9239 0 -0.3827 1 0 0
  [2,24,0.9239,0,-0.3827,1,0,0],
];
makepoly(ldraw_lib__4_4edge(), line=0.2);
// file: ../p/4-4cyli.scad
use <../lib.scad>
function ldraw_lib__4_4cyli() = [
// 0 Cylinder 1.0
// 0 Name: 4-4cyli.dat
// 0 Author: James Jessiman
// 0 !LDRAW_ORG Primitive UPDATE 2005-01
// 0 !LICENSE Licensed under CC BY 2.0 and CC BY 4.0 : see CAreadme.txt
// 
// 0 BFC CERTIFY CCW
  [0,"BFC","CERTIFY"],
  [0,"BFC","CCW"],
// 
// 0 !HISTORY 1998-12-15 [PTadmin] Official Update 1998-10
// 0 !HISTORY 2002-03-23 [sbliss] Added BFC statement; merged headers from files in distributions LDraw 0.27 and Complete.
// 0 !HISTORY 2002-04-25 [PTadmin] Official Update 2002-02
// 0 !HISTORY 2004-12-14 [guyvivan] BFC CCW
// 0 !HISTORY 2005-12-28 [PTadmin] Official Update 2005-01
// 0 !HISTORY 2007-06-24 [PTadmin] Header formatted for Contributor Agreement
// 0 !HISTORY 2008-07-01 [PTadmin] Official Update 2008-01
// 
// 
// 4 16 1 1 0 0.9239 1 0.3827 0.9239 0 0.3827 1 0 0
  [4,16,1,1,0,0.9239,1,0.3827,0.9239,0,0.3827,1,0,0],
// 5 24 1 0 0 1 1 0 0.9239 0 0.3827 0.9239 0 -0.3827
  [5,24,1,0,0,1,1,0,0.9239,0,0.3827,0.9239,0,-0.3827],
// 4 16 0.9239 1 0.3827 0.7071 1 0.7071 0.7071 0 0.7071 0.9239 0 0.3827
  [4,16,0.9239,1,0.3827,0.7071,1,0.7071,0.7071,0,0.7071,0.9239,0,0.3827],
// 5 24 0.9239 0 0.3827 0.9239 1 0.3827 0.7071 0 0.7071 1 0 0
  [5,24,0.9239,0,0.3827,0.9239,1,0.3827,0.7071,0,0.7071,1,0,0],
// 4 16 0.7071 1 0.7071 0.3827 1 0.9239 0.3827 0 0.9239 0.7071 0 0.7071
  [4,16,0.7071,1,0.7071,0.3827,1,0.9239,0.3827,0,0.9239,0.7071,0,0.7071],
// 5 24 0.7071 0 0.7071 0.7071 1 0.7071 0.3827 0 0.9239 0.9239 0 0.3827
  [5,24,0.7071,0,0.7071,0.7071,1,0.7071,0.3827,0,0.9239,0.9239,0,0.3827],
// 4 16 0.3827 1 0.9239 0 1 1 0 0 1 0.3827 0 0.9239
  [4,16,0.3827,1,0.9239,0,1,1,0,0,1,0.3827,0,0.9239],
// 5 24 0.3827 0 0.9239 0.3827 1 0.9239 0 0 1 0.7071 0 0.7071
  [5,24,0.3827,0,0.9239,0.3827,1,0.9239,0,0,1,0.7071,0,0.7071],
// 4 16 0 1 1 -0.3827 1 0.9239 -0.3827 0 0.9239 0 0 1
  [4,16,0,1,1,-0.3827,1,0.9239,-0.3827,0,0.9239,0,0,1],
// 5 24 0 0 1 0 1 1 -0.3827 0 0.9239 0.3827 0 0.9239
  [5,24,0,0,1,0,1,1,-0.3827,0,0.9239,0.3827,0,0.9239],
// 4 16 -0.3827 1 0.9239 -0.7071 1 0.7071 -0.7071 0 0.7071 -0.3827 0 0.9239
  [4,16,-0.3827,1,0.9239,-0.7071,1,0.7071,-0.7071,0,0.7071,-0.3827,0,0.9239],
// 5 24 -0.3827 0 0.9239 -0.3827 1 0.9239 -0.7071 0 0.7071 0 0 1
  [5,24,-0.3827,0,0.9239,-0.3827,1,0.9239,-0.7071,0,0.7071,0,0,1],
// 4 16 -0.7071 1 0.7071 -0.9239 1 0.3827 -0.9239 0 0.3827 -0.7071 0 0.7071
  [4,16,-0.7071,1,0.7071,-0.9239,1,0.3827,-0.9239,0,0.3827,-0.7071,0,0.7071],
// 5 24 -0.7071 0 0.7071 -0.7071 1 0.7071 -0.9239 0 0.3827 -0.3827 0 0.9239
  [5,24,-0.7071,0,0.7071,-0.7071,1,0.7071,-0.9239,0,0.3827,-0.3827,0,0.9239],
// 4 16 -0.9239 1 0.3827 -1 1 0 -1 0 0 -0.9239 0 0.3827
  [4,16,-0.9239,1,0.3827,-1,1,0,-1,0,0,-0.9239,0,0.3827],
// 5 24 -0.9239 0 0.3827 -0.9239 1 0.3827 -1 0 0 -0.7071 0 0.7071
  [5,24,-0.9239,0,0.3827,-0.9239,1,0.3827,-1,0,0,-0.7071,0,0.7071],
// 4 16 -1 1 0 -0.9239 1 -0.3827 -0.9239 0 -0.3827 -1 0 0
  [4,16,-1,1,0,-0.9239,1,-0.3827,-0.9239,0,-0.3827,-1,0,0],
// 5 24 -1 0 0 -1 1 0 -0.9239 0 -0.3827 -0.9239 0 0.3827
  [5,24,-1,0,0,-1,1,0,-0.9239,0,-0.3827,-0.9239,0,0.3827],
// 4 16 -0.9239 1 -0.3827 -0.7071 1 -0.7071 -0.7071 0 -0.7071 -0.9239 0 -0.3827
  [4,16,-0.9239,1,-0.3827,-0.7071,1,-0.7071,-0.7071,0,-0.7071,-0.9239,0,-0.3827],
// 5 24 -0.9239 0 -0.3827 -0.9239 1 -0.3827 -0.7071 0 -0.7071 -1 0 0
  [5,24,-0.9239,0,-0.3827,-0.9239,1,-0.3827,-0.7071,0,-0.7071,-1,0,0],
// 4 16 -0.7071 1 -0.7071 -0.3827 1 -0.9239 -0.3827 0 -0.9239 -0.7071 0 -0.7071
  [4,16,-0.7071,1,-0.7071,-0.3827,1,-0.9239,-0.3827,0,-0.9239,-0.7071,0,-0.7071],
// 5 24 -0.7071 0 -0.7071 -0.7071 1 -0.7071 -0.3827 0 -0.9239 -0.9239 0 -0.3827
  [5,24,-0.7071,0,-0.7071,-0.7071,1,-0.7071,-0.3827,0,-0.9239,-0.9239,0,-0.3827],
// 4 16 -0.3827 1 -0.9239 0 1 -1 0 0 -1 -0.3827 0 -0.9239
  [4,16,-0.3827,1,-0.9239,0,1,-1,0,0,-1,-0.3827,0,-0.9239],
// 5 24 -0.3827 0 -0.9239 -0.3827 1 -0.9239 0 0 -1 -0.7071 0 -0.7071
  [5,24,-0.3827,0,-0.9239,-0.3827,1,-0.9239,0,0,-1,-0.7071,0,-0.7071],
// 4 16 0 1 -1 0.3827 1 -0.9239 0.3827 0 -0.9239 0 0 -1
  [4,16,0,1,-1,0.3827,1,-0.9239,0.3827,0,-0.9239,0,0,-1],
// 5 24 0 0 -1 0 1 -1 0.3827 0 -0.9239 -0.3827 0 -0.9239
  [5,24,0,0,-1,0,1,-1,0.3827,0,-0.9239,-0.3827,0,-0.9239],
// 4 16 0.3827 1 -0.9239 0.7071 1 -0.7071 0.7071 0 -0.7071 0.3827 0 -0.9239
  [4,16,0.3827,1,-0.9239,0.7071,1,-0.7071,0.7071,0,-0.7071,0.3827,0,-0.9239],
// 5 24 0.3827 0 -0.9239 0.3827 1 -0.9239 0.7071 0 -0.7071 0 0 -1
  [5,24,0.3827,0,-0.9239,0.3827,1,-0.9239,0.7071,0,-0.7071,0,0,-1],
// 4 16 0.7071 1 -0.7071 0.9239 1 -0.3827 0.9239 0 -0.3827 0.7071 0 -0.7071
  [4,16,0.7071,1,-0.7071,0.9239,1,-0.3827,0.9239,0,-0.3827,0.7071,0,-0.7071],
// 5 24 0.7071 0 -0.7071 0.7071 1 -0.7071 0.9239 0 -0.3827 0.3827 0 -0.9239
  [5,24,0.7071,0,-0.7071,0.7071,1,-0.7071,0.9239,0,-0.3827,0.3827,0,-0.9239],
// 4 16 0.9239 1 -0.3827 1 1 0 1 0 0 0.9239 0 -0.3827
  [4,16,0.9239,1,-0.3827,1,1,0,1,0,0,0.9239,0,-0.3827],
// 5 24 0.9239 0 -0.3827 0.9239 1 -0.3827 1 0 0 0.7071 0 -0.7071
  [5,24,0.9239,0,-0.3827,0.9239,1,-0.3827,1,0,0,0.7071,0,-0.7071],
// 0
];
makepoly(ldraw_lib__4_4cyli(), line=0.2);
// main file
use <../lib.scad>
use <../p/4-4cyli.scad>
use <../p/4-4edge.scad>
use <../p/4-4ring1.scad>
use <../p/48/4-4aring.scad>
use <../p/48/4-4cyli.scad>
use <../p/48/4-4edge.scad>
use <../p/48/4-4ring4.scad>
function ldraw_lib__32051() = [
// 0 ~Technic Gear 24 Tooth Clutch Lid (Needs work)
// 0 Name: 32051.dat
// 0 Author: Marc Klein [marckl]
// 0 !LDRAW_ORG Part UPDATE 2012-03
// 0 !LICENSE Licensed under CC BY 2.0 and CC BY 4.0 : see CAreadme.txt
// 
// 0 BFC CERTIFY CCW
  [0,"BFC","CERTIFY"],
  [0,"BFC","CCW"],
// 
// 0 !HISTORY 2000-09-30 [PTadmin] Official Update 2000-02
// 0 !HISTORY 2007-07-09 [PTadmin] Header formatted for Contributor Agreement
// 0 !HISTORY 2008-07-01 [PTadmin] Official Update 2008-01
// 0 !HISTORY 2010-02-03 [mikeheide] created single parts and split from 60.dat
// 0 !HISTORY 2012-12-28 [PTadmin] Official Update 2012-03
// 
// 
// 0 // clips for fixing to housing not modeled
// 
// 1 16 0 0 8 9 0 0 0 0 9 0 1 0 4-4ring1.dat
  [1,16,0,0,8,9,0,0,0,0,9,0,1,0, ldraw_lib__4_4ring1()],
// 1 16 0 0 10 -9 0 0 0 0 9 0 -1 0 4-4ring1.dat
  [1,16,0,0,10,-9,0,0,0,0,9,0,-1,0, ldraw_lib__4_4ring1()],
// 1 16 0 0 10 -18 0 0 0 0 18 0 -1 0 48\4-4aring.dat
  [1,16,0,0,10,-18,0,0,0,0,18,0,-1,0, ldraw_lib__48__4_4aring()],
// 1 16 0 0 8 18 0 0 0 0 18 0 1 0 48\4-4aring.dat
  [1,16,0,0,8,18,0,0,0,0,18,0,1,0, ldraw_lib__48__4_4aring()],
// 1 16 0 0 8 4.5 0 0 0 0 4.5 0 1 0 48\4-4ring4.dat
  [1,16,0,0,8,4.5,0,0,0,0,4.5,0,1,0, ldraw_lib__48__4_4ring4()],
// 1 16 0 0 10 -4.5 0 0 0 0 4.5 0 -1 0 48\4-4ring4.dat
  [1,16,0,0,10,-4.5,0,0,0,0,4.5,0,-1,0, ldraw_lib__48__4_4ring4()],
// 1 16 0 0 10 9 0 0 0 0 9 0 1 0 4-4edge.dat
  [1,16,0,0,10,9,0,0,0,0,9,0,1,0, ldraw_lib__4_4edge()],
// 0 BFC INVERTNEXT
  [0,"BFC","INVERTNEXT"],
// 1 16 0 0 8 0 0 9 9 0 0 0 2 0 4-4cyli.dat
  [1,16,0,0,8,0,0,9,9,0,0,0,2,0, ldraw_lib__4_4cyli()],
// 1 16 0 0 8 9 0 0 0 0 9 0 1 0 4-4edge.dat
  [1,16,0,0,8,9,0,0,0,0,9,0,1,0, ldraw_lib__4_4edge()],
// 1 16 0 0 8 22.5 0 0 0 0 22.5 0 1 0 48\4-4edge.dat
  [1,16,0,0,8,22.5,0,0,0,0,22.5,0,1,0, ldraw_lib__48__4_4edge()],
// 1 16 0 0 10 22.5 0 0 0 0 22.5 0 1 0 48\4-4edge.dat
  [1,16,0,0,10,22.5,0,0,0,0,22.5,0,1,0, ldraw_lib__48__4_4edge()],
// 1 16 0 0 8 22.5 0 0 0 0 22.5 0 2 0 48\4-4cyli.dat
  [1,16,0,0,8,22.5,0,0,0,0,22.5,0,2,0, ldraw_lib__48__4_4cyli()],
];
makepoly(ldraw_lib__32051(), line=0.2);
